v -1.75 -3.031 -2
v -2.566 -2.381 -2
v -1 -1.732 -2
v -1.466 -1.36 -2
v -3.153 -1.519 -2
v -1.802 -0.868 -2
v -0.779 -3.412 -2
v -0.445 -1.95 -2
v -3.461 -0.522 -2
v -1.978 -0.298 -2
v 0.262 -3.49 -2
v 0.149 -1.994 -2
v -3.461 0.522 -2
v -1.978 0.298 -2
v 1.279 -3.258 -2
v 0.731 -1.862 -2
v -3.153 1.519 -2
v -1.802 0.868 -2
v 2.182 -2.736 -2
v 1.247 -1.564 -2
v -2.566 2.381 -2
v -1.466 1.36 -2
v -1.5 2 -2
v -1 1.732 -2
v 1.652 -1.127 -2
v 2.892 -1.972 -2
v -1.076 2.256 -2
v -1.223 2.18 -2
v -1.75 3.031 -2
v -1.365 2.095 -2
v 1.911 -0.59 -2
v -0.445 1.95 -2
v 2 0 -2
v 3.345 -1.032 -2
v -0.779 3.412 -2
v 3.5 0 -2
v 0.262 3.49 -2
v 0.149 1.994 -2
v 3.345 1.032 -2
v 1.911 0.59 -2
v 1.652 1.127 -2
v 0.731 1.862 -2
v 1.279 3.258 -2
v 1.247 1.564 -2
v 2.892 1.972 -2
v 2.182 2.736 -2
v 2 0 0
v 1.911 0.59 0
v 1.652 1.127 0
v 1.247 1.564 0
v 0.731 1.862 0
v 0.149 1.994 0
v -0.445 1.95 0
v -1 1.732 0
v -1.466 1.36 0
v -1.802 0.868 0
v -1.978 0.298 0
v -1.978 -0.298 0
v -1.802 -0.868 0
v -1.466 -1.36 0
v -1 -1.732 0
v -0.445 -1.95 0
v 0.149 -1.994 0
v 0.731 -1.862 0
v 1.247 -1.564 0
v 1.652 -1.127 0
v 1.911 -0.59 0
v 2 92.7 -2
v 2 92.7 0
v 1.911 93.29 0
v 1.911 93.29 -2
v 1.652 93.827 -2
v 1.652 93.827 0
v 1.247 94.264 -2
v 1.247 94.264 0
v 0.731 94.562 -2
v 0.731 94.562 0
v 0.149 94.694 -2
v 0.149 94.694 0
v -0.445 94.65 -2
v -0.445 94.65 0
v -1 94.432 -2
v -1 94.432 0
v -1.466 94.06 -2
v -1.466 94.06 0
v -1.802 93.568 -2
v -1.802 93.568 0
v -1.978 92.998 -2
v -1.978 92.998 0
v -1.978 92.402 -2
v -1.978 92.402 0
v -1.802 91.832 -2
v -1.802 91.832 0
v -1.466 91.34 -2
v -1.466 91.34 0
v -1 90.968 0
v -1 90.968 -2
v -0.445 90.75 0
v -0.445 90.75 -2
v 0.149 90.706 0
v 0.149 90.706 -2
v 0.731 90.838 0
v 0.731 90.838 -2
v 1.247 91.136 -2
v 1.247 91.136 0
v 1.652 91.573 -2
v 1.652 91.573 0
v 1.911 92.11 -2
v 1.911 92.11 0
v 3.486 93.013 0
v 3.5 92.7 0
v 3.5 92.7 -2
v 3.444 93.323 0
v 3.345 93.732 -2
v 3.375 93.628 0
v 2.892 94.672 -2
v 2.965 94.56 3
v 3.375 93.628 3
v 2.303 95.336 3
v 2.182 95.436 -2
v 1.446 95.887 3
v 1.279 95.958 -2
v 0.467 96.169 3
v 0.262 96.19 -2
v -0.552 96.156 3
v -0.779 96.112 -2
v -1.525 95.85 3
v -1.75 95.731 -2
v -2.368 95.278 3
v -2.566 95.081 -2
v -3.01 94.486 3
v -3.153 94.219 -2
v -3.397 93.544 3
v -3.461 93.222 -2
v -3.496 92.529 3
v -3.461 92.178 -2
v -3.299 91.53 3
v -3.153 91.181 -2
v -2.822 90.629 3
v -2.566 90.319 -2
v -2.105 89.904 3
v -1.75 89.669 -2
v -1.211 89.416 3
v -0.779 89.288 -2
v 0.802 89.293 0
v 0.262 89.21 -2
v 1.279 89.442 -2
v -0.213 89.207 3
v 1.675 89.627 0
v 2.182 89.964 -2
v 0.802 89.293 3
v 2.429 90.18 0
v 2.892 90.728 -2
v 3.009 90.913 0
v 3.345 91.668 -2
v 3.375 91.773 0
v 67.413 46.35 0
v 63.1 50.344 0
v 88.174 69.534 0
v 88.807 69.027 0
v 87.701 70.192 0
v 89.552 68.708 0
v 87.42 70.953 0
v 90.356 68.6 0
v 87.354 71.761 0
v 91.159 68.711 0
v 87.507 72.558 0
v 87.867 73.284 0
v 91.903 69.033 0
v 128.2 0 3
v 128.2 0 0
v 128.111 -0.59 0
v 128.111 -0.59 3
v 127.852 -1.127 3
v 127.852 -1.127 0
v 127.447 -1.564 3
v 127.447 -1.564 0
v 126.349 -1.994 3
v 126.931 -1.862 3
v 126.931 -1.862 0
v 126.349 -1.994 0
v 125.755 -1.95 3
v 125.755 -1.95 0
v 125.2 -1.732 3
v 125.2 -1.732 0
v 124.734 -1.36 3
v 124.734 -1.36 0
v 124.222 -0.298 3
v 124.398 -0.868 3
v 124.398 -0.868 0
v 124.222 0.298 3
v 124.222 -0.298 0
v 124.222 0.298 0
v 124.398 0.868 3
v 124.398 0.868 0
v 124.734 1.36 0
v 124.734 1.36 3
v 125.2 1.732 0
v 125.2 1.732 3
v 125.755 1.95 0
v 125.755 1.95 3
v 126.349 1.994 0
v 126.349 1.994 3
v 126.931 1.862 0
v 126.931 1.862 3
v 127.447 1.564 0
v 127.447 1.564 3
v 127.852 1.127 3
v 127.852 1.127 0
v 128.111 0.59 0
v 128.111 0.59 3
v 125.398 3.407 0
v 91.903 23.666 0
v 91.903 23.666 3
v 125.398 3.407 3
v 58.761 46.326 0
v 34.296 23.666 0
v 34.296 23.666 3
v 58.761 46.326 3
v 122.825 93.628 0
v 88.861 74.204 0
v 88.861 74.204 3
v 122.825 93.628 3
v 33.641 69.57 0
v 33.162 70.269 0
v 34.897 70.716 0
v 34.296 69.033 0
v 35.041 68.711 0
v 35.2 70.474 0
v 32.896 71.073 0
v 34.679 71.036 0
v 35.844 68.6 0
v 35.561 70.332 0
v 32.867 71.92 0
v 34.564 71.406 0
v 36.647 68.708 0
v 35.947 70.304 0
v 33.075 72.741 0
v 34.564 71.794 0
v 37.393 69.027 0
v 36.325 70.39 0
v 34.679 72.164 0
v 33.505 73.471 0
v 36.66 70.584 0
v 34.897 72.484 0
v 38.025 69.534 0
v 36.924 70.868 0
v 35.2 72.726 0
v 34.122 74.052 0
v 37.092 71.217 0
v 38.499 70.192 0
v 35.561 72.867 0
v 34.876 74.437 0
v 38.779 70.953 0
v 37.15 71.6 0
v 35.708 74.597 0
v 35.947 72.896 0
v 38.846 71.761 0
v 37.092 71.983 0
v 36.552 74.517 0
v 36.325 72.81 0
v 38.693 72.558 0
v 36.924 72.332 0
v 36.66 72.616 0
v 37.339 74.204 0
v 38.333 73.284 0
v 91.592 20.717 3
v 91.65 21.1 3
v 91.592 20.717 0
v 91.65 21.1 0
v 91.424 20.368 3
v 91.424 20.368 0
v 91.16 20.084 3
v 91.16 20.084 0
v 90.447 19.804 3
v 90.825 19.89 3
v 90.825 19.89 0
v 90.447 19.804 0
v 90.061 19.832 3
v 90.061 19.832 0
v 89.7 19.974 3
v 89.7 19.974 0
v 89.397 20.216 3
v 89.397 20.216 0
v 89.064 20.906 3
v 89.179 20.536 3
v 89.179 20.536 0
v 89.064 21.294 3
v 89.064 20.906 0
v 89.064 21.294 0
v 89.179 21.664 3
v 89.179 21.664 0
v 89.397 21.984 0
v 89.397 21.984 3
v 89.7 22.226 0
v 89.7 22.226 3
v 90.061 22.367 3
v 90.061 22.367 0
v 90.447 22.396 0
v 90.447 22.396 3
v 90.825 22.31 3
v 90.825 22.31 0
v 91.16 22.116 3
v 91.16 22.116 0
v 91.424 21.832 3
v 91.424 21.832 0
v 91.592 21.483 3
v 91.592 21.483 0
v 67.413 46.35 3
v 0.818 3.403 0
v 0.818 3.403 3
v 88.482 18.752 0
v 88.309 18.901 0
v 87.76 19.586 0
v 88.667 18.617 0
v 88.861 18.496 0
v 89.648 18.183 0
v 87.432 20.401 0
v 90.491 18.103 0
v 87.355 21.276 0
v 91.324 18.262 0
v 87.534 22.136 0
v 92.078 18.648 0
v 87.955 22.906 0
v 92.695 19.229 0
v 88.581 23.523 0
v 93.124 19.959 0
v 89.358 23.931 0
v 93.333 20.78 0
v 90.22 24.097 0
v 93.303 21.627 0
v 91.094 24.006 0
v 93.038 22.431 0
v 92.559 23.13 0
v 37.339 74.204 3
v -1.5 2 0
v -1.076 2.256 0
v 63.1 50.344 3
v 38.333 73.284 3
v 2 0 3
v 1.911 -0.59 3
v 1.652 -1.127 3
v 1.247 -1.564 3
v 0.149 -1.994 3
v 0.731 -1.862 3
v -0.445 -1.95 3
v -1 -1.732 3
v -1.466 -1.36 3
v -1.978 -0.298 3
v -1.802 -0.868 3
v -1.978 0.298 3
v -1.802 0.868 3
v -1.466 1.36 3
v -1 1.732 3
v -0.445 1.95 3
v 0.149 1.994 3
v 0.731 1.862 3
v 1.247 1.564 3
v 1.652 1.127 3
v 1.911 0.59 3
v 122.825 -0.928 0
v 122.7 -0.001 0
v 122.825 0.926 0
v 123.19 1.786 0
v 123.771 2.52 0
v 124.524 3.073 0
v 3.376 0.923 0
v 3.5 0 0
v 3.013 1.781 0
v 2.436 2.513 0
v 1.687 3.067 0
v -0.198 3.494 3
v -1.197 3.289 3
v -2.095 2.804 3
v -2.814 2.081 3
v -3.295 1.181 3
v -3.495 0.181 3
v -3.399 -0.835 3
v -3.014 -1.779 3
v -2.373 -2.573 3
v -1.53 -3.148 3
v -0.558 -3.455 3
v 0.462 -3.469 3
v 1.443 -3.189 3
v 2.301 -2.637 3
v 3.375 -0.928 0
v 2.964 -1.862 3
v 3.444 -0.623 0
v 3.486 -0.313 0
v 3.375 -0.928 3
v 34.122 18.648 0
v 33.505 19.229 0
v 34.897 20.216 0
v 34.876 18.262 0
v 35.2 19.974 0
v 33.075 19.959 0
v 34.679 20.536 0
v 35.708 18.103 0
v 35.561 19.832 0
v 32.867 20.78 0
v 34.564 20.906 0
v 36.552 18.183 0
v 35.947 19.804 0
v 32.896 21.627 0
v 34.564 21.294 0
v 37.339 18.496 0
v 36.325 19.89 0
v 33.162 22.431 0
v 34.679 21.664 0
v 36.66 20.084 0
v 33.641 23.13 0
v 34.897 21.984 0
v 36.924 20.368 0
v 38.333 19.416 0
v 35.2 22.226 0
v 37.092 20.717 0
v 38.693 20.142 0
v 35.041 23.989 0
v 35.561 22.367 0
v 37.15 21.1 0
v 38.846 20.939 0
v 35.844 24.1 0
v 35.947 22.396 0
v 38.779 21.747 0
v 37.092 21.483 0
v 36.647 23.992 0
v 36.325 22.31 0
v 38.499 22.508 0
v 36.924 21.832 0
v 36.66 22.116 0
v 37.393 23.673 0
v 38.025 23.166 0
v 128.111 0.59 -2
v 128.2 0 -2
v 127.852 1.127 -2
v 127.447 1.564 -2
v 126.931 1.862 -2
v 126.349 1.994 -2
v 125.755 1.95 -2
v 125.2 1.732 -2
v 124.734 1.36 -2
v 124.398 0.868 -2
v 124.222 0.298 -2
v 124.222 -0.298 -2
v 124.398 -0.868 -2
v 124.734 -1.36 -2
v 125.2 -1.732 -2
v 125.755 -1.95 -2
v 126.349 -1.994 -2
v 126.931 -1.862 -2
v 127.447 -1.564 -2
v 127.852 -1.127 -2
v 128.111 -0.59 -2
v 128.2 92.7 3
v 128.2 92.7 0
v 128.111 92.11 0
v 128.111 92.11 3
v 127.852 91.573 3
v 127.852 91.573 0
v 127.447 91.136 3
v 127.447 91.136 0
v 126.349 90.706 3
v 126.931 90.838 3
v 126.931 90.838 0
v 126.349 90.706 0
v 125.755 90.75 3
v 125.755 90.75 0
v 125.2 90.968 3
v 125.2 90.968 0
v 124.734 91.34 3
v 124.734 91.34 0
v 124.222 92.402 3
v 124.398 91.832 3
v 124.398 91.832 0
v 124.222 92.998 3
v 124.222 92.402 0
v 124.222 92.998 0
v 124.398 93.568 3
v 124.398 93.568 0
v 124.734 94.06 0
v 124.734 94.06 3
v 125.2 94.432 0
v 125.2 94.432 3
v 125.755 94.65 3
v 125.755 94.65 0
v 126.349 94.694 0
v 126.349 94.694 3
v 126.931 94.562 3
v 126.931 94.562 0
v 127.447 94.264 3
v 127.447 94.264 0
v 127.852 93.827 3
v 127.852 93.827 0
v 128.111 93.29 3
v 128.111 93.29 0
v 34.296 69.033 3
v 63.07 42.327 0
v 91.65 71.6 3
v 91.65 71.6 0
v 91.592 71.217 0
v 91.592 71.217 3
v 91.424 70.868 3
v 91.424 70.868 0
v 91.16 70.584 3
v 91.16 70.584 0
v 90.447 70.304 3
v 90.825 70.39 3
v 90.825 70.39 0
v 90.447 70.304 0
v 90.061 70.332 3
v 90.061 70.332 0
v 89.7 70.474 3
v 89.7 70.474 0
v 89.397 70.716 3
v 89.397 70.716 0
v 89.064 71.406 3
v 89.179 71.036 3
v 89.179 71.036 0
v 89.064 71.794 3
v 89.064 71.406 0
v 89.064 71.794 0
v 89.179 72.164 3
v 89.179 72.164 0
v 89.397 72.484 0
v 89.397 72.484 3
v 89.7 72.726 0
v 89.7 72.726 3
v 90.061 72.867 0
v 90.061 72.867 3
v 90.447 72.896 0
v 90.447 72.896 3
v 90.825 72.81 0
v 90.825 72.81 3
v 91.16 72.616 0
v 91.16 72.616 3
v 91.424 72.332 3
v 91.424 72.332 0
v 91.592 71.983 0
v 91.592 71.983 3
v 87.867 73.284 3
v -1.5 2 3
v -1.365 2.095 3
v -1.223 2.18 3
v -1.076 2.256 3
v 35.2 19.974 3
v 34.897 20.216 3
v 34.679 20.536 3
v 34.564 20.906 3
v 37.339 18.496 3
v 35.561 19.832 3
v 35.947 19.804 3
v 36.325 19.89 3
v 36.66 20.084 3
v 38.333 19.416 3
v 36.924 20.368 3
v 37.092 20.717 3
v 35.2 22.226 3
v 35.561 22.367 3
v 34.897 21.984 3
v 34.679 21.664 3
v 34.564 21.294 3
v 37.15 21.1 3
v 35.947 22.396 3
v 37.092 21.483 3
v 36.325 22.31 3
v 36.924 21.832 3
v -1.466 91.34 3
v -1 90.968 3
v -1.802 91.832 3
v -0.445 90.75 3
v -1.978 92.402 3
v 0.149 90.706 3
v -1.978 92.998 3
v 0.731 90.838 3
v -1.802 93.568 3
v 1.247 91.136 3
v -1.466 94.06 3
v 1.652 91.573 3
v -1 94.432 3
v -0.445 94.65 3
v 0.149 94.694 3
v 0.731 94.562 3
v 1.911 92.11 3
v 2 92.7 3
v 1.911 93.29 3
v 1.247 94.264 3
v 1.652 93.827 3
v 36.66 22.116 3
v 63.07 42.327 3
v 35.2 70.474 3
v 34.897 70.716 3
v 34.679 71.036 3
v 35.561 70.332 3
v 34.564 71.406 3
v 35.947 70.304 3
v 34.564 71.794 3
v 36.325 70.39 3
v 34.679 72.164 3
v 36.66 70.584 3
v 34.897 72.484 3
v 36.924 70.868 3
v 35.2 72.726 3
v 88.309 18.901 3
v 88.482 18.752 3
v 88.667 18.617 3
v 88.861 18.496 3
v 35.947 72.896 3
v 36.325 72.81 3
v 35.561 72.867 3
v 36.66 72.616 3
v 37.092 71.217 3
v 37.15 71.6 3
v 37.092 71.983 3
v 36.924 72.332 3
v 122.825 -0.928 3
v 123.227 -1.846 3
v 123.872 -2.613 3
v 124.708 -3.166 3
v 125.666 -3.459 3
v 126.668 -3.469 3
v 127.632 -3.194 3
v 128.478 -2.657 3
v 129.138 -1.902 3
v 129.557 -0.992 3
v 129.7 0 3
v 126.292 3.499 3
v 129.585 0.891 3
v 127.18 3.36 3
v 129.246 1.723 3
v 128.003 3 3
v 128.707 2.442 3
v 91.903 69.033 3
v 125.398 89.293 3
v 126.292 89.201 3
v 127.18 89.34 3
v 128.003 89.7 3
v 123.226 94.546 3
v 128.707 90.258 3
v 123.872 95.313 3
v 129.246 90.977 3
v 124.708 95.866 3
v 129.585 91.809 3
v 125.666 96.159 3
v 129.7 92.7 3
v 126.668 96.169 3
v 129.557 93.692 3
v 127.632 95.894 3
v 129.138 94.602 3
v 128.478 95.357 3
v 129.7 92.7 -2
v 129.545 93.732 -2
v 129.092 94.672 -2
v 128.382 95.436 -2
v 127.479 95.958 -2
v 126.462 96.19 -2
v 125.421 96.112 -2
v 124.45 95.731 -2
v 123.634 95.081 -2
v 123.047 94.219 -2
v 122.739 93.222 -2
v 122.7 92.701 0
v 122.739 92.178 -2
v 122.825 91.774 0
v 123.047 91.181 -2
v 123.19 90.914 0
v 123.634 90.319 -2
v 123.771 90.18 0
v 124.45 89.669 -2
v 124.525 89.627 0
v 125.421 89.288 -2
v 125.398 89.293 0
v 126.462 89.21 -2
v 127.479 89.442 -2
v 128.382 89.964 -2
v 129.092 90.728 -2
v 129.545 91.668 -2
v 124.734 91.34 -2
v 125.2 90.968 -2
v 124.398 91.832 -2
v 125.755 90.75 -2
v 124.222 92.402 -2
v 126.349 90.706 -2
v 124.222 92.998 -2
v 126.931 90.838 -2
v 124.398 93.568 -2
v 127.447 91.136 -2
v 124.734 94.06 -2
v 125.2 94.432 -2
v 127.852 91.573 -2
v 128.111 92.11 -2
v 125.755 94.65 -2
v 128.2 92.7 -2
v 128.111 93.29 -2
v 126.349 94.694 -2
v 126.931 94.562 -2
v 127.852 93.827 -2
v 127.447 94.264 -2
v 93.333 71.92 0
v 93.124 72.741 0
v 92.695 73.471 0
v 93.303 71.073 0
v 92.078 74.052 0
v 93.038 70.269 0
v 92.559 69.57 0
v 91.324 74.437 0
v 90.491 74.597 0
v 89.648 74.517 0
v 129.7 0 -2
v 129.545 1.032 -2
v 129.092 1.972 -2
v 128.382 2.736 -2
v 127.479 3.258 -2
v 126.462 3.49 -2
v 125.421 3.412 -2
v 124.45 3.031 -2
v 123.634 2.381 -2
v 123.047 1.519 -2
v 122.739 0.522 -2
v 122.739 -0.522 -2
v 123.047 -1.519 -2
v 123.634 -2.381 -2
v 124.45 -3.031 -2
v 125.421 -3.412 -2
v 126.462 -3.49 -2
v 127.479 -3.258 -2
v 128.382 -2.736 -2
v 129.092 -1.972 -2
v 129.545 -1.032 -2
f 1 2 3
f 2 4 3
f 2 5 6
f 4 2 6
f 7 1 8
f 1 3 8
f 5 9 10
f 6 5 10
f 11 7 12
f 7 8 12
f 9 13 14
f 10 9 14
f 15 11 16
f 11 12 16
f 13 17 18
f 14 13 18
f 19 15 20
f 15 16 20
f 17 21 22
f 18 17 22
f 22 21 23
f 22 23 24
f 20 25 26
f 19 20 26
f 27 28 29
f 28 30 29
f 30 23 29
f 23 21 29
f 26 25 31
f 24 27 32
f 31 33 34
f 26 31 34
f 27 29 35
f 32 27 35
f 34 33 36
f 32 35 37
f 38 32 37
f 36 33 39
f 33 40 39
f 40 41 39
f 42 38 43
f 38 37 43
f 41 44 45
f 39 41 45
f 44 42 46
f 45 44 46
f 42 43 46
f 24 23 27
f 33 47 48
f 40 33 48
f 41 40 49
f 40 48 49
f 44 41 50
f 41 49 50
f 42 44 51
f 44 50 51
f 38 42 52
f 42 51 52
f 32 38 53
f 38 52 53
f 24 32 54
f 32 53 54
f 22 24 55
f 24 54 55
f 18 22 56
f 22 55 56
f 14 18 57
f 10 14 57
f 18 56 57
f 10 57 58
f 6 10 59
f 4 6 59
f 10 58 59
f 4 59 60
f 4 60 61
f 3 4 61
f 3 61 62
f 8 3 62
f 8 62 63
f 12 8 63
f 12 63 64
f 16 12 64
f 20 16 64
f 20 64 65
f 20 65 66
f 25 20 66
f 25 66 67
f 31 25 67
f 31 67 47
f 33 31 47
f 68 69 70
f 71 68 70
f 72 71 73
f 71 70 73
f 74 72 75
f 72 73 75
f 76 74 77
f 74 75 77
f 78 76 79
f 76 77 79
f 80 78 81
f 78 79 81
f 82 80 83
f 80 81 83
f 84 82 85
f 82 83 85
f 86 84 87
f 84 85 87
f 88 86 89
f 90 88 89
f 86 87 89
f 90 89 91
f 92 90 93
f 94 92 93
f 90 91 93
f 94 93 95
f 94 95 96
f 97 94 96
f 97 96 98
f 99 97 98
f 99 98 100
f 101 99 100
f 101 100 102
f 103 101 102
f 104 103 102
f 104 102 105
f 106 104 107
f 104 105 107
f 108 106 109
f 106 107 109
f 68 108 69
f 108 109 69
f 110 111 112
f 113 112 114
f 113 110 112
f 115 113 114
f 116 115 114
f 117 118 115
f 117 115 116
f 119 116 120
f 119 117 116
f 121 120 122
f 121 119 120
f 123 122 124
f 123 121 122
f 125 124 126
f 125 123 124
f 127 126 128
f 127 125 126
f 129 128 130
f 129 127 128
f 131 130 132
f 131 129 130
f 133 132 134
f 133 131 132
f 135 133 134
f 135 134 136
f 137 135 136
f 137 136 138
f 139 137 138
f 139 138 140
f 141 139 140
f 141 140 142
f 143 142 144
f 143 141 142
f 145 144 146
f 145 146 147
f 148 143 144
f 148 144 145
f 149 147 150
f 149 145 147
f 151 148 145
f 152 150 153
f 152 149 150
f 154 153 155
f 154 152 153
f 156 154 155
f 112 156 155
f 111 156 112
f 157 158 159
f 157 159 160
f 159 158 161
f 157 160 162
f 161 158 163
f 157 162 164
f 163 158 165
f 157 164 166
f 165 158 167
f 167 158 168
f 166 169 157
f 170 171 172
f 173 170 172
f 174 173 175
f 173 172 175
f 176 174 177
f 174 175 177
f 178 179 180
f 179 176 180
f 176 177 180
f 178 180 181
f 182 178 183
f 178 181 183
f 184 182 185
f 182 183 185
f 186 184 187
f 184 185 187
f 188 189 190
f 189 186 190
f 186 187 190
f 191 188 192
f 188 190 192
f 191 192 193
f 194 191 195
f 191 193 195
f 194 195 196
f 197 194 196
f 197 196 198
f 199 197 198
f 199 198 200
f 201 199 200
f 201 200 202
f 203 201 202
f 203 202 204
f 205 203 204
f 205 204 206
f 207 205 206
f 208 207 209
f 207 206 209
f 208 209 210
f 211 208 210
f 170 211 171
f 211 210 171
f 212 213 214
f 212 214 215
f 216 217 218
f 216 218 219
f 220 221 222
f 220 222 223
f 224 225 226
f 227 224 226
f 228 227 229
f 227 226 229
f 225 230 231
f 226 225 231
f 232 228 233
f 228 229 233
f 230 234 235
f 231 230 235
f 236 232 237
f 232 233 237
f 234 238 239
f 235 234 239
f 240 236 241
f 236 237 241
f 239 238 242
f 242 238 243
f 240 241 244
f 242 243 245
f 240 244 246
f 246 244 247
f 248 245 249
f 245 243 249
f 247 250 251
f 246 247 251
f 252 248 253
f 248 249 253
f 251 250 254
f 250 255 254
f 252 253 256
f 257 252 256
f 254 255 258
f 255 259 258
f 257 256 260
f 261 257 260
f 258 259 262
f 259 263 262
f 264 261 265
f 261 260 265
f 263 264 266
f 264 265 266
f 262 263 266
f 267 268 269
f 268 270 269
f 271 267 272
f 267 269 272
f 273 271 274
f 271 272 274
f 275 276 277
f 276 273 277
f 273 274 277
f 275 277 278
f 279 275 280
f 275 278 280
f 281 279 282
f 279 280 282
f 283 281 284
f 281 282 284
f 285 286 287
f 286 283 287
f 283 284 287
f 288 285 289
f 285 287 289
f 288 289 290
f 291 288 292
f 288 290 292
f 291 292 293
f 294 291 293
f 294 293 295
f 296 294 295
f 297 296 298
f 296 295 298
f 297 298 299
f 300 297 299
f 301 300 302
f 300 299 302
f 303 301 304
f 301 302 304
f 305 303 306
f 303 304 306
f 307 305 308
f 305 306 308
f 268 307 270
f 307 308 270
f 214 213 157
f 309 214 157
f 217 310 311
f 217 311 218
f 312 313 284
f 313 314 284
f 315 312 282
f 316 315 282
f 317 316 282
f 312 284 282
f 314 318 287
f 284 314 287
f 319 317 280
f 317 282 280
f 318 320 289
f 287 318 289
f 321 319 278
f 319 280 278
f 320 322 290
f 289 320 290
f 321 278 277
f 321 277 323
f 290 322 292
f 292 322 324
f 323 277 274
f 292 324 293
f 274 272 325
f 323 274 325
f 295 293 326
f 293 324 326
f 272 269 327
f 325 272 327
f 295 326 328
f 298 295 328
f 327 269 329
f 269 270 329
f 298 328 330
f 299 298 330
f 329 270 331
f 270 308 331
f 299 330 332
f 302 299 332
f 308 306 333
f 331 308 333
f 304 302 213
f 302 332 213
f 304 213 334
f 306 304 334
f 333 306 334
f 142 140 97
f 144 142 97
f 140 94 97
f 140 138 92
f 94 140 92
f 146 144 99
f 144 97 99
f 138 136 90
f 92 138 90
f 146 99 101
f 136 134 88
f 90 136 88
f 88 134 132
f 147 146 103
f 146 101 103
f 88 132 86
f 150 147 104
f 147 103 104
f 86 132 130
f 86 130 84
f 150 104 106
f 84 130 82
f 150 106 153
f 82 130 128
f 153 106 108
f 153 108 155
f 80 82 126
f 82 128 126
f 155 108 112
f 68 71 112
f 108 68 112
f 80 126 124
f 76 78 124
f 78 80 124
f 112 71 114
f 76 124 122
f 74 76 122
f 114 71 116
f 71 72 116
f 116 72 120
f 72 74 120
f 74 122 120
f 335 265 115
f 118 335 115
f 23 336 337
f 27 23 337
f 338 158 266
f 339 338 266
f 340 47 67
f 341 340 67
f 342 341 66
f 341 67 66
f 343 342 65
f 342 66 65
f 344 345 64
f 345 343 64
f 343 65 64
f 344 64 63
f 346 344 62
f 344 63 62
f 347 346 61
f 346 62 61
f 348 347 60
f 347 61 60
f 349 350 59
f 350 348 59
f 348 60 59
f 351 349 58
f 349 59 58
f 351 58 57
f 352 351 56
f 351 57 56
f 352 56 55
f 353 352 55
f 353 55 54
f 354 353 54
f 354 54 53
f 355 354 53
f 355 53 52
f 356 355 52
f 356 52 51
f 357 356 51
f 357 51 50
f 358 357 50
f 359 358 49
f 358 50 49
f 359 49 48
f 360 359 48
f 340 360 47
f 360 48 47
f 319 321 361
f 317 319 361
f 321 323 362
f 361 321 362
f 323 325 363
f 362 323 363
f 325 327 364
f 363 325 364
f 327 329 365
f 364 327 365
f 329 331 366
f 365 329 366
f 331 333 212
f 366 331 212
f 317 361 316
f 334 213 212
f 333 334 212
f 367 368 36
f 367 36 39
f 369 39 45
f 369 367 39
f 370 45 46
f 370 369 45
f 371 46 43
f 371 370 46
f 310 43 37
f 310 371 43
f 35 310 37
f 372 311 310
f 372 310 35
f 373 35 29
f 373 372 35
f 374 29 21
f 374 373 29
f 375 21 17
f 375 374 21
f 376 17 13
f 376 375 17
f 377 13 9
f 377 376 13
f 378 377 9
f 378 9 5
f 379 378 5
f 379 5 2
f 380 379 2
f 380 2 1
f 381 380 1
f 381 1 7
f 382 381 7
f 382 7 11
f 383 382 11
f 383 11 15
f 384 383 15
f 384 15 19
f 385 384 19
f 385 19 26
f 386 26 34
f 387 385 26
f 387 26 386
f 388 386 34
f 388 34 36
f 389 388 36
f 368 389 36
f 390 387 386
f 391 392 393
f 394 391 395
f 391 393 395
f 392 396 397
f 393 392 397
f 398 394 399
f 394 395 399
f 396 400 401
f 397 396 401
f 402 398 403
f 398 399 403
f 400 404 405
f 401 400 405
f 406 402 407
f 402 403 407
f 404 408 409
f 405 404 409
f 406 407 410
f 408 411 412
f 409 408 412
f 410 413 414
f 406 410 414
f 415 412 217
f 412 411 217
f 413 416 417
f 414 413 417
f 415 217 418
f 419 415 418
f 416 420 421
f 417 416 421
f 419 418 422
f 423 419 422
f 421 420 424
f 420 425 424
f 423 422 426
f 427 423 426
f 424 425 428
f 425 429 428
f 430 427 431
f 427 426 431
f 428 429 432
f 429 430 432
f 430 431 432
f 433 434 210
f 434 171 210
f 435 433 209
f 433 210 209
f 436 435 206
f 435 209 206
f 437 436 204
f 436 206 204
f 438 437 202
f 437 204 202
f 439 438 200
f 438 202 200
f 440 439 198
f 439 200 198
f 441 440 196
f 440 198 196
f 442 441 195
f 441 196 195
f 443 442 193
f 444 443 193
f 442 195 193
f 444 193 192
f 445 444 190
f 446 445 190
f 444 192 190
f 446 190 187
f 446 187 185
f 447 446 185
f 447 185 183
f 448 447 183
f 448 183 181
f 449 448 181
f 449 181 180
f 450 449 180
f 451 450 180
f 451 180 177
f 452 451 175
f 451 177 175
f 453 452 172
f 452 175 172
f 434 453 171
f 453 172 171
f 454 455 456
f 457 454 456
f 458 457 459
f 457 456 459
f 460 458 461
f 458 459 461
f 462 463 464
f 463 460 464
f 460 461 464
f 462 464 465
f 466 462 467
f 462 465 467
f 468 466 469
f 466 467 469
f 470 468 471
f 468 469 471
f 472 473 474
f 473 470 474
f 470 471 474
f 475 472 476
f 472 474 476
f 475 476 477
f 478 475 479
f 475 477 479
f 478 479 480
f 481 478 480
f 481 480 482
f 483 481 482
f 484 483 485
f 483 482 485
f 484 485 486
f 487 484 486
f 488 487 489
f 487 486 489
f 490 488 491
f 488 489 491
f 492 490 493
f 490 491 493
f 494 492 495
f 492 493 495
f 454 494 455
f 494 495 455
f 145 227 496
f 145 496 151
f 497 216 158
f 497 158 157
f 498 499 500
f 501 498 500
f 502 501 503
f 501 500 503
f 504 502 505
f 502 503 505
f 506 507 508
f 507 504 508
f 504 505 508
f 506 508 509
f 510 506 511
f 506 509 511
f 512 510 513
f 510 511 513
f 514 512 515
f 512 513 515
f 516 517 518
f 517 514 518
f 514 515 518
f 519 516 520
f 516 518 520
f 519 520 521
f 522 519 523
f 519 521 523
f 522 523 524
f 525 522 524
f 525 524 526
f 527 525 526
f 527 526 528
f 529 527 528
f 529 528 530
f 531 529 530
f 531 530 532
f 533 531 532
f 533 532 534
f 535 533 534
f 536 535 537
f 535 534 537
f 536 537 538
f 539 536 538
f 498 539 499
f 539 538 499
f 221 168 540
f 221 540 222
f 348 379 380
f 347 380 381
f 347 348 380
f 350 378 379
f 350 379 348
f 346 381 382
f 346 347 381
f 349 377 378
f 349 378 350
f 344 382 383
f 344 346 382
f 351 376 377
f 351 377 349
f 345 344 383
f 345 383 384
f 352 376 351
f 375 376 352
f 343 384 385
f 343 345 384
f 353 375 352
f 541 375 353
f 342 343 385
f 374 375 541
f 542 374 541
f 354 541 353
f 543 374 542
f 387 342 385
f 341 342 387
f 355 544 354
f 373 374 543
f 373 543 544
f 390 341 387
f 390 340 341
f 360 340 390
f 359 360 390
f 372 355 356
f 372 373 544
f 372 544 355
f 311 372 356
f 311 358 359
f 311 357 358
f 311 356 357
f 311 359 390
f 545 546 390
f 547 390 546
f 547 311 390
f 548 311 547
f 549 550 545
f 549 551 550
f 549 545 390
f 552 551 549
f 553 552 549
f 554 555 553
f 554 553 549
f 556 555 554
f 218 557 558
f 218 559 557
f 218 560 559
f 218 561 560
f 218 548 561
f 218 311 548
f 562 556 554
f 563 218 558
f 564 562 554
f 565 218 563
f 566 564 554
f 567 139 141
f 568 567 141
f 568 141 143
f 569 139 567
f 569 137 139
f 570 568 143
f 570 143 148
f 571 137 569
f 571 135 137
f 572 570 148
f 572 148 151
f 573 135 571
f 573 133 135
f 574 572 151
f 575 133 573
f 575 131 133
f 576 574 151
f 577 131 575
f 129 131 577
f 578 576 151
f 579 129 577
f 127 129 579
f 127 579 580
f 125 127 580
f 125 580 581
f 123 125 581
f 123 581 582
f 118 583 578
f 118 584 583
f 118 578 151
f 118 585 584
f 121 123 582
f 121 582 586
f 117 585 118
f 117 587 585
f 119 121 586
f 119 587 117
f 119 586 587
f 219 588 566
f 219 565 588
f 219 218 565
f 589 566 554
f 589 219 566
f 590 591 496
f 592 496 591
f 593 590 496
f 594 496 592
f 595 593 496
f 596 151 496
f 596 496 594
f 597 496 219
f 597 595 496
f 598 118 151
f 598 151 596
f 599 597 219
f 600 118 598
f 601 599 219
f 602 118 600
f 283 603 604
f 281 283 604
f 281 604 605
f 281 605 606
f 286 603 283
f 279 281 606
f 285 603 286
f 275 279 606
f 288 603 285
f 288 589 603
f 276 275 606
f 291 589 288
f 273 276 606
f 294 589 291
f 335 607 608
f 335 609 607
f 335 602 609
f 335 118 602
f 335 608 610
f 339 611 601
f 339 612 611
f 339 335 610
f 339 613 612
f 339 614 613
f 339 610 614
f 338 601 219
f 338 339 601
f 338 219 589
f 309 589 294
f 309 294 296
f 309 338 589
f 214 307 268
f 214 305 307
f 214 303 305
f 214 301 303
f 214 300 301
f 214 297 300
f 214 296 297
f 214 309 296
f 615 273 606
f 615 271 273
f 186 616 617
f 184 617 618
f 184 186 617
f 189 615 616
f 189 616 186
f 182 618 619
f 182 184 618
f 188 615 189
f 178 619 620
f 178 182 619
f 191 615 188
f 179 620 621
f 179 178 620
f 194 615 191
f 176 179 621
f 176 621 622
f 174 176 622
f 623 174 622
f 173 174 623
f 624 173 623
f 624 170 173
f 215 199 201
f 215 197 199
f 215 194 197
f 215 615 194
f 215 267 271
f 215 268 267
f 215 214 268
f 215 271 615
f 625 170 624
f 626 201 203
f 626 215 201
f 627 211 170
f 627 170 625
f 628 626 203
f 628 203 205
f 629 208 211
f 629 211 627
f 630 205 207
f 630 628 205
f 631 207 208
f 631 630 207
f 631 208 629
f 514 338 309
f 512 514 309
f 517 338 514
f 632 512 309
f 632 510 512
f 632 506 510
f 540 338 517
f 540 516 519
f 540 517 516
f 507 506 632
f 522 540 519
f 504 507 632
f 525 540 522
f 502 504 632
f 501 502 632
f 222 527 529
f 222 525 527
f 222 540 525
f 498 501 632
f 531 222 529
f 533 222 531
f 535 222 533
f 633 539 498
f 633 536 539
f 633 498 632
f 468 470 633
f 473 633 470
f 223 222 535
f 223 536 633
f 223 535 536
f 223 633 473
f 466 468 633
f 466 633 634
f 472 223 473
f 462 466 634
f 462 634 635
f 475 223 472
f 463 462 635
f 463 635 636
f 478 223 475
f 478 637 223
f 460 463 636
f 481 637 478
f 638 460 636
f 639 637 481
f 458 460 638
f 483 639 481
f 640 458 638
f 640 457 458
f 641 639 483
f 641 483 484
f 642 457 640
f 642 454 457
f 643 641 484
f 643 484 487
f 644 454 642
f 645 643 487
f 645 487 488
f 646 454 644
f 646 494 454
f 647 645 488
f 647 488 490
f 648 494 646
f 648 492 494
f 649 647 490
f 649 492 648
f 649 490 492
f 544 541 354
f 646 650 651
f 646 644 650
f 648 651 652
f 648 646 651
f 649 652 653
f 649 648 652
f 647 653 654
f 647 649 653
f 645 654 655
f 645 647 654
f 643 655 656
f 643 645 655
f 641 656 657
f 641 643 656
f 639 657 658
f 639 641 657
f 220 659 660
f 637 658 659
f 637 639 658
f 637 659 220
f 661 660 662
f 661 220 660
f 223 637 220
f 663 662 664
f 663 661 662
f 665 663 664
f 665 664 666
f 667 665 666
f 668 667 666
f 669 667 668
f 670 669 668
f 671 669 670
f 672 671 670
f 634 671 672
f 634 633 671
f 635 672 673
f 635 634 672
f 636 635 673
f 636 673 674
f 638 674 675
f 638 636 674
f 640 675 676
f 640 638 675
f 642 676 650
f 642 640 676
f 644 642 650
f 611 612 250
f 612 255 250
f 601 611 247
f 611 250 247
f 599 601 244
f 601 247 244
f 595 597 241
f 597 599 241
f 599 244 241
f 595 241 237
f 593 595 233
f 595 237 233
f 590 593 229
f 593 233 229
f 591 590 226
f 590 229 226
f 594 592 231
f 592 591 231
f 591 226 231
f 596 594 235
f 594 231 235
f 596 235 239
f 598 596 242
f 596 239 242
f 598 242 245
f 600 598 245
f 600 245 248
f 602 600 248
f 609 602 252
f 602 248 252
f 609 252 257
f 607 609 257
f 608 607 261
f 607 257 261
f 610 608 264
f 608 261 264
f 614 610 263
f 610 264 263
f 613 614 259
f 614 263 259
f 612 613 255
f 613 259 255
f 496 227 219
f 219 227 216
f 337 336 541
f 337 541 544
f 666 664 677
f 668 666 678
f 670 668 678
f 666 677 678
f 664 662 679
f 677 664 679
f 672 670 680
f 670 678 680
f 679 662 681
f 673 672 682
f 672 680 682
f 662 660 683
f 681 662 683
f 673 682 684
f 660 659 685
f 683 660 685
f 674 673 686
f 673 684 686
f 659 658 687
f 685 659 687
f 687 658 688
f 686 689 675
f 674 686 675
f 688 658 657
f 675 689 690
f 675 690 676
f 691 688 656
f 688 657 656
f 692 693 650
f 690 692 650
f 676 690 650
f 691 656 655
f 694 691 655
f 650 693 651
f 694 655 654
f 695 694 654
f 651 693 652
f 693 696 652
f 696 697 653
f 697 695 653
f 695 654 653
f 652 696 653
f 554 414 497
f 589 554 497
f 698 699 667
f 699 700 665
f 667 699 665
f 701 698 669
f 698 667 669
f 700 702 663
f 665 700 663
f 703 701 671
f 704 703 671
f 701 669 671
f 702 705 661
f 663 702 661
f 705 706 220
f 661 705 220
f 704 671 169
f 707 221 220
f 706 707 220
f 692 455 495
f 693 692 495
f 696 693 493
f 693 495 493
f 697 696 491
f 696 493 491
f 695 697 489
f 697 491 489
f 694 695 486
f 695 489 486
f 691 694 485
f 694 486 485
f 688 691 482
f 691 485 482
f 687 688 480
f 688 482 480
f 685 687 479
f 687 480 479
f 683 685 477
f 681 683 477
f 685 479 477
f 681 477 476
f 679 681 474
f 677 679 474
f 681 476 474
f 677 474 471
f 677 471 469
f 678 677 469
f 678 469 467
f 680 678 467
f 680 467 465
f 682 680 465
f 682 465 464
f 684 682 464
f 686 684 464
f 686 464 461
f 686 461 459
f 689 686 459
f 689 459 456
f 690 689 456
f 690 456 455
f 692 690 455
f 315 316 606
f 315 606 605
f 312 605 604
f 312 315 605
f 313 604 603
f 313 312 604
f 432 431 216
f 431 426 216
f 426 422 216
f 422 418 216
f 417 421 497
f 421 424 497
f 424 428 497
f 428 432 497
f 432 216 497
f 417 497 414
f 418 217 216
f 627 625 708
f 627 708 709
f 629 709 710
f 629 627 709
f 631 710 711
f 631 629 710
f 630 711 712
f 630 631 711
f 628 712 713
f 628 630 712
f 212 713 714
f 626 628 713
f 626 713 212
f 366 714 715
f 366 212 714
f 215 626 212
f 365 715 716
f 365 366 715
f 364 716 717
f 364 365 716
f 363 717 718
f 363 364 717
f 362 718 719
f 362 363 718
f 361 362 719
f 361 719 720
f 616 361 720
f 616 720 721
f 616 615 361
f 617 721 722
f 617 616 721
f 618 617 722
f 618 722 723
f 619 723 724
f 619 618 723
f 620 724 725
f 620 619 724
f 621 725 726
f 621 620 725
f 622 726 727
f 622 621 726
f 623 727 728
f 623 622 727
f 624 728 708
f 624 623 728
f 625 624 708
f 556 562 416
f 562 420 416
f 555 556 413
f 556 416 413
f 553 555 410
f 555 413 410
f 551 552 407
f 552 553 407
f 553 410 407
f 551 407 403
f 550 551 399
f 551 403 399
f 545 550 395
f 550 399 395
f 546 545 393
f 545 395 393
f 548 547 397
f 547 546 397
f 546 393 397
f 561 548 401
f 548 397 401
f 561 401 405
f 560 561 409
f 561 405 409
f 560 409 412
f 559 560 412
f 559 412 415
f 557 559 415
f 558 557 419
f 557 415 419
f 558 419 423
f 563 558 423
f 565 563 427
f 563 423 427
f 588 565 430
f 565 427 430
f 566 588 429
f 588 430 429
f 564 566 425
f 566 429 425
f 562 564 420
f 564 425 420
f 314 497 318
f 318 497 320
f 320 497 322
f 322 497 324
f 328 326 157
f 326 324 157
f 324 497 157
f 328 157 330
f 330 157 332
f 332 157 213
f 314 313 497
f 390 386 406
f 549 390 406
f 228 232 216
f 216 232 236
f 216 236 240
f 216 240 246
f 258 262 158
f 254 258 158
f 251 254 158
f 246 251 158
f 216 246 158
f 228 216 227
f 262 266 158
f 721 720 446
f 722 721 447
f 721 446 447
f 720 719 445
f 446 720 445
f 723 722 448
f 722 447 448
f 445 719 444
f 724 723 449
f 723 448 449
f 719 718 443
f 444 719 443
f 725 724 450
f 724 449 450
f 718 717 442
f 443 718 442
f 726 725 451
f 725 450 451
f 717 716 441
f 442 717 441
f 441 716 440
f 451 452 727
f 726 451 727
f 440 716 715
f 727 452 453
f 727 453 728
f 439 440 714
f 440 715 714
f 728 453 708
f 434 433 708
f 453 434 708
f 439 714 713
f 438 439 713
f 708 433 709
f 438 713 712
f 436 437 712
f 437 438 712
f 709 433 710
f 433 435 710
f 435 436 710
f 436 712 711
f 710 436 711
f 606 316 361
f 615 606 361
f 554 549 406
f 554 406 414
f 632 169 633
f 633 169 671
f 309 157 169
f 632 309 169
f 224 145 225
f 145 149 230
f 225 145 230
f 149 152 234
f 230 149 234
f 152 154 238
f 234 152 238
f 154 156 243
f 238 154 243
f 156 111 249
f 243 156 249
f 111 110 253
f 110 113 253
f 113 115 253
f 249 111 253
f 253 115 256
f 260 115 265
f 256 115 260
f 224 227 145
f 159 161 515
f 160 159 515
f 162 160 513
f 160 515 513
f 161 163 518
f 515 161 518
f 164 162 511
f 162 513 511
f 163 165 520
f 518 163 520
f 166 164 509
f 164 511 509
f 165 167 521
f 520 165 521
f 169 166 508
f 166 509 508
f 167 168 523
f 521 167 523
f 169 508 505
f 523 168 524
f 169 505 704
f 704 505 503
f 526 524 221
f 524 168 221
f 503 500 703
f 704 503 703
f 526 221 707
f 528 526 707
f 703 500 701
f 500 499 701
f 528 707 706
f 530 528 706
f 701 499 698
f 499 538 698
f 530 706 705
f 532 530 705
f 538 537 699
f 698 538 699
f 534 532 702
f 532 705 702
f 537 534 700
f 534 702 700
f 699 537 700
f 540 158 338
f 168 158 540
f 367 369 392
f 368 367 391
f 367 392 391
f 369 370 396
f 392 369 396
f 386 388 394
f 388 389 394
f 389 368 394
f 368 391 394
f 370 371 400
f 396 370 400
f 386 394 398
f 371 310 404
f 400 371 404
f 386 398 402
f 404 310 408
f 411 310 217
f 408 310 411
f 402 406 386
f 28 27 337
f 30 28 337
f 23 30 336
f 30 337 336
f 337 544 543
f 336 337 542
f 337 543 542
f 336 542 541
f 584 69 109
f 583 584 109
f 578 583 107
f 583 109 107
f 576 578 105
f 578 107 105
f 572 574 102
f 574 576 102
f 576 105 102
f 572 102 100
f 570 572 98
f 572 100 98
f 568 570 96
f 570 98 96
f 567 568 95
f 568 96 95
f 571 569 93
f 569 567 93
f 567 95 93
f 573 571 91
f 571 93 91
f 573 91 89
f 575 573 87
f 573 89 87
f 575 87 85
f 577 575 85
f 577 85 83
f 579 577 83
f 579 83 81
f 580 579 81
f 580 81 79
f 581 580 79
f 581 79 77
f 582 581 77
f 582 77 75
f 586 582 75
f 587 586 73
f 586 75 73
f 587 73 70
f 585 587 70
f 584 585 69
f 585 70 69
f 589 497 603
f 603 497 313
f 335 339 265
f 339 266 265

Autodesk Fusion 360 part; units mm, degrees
sketch "Sketch1" plane through (0, 0, 0) normal (0, 0, 1) x (1, 0, 0)
  line L0 (0, 0) -> (126.2, 0) construction
  line L1 (126.2, 0) -> (126.2, 92.7) construction
  line L2 (126.2, 92.7) -> (0, 92.7) construction
  line L3 (0, 92.7) -> (0, 0) construction
  circle A0 centre (126.2, 0) radius 2
  circle A1 centre (126.2, 92.7) radius 2
  circle A2 centre (0, 92.7) radius 2
  circle A3 centre (0, 0) radius 2
  line L4 (0, 92.7) -> (-5, 92.7) construction
  line L5 (0, 92.7) -> (0, 97.7) construction
  line L6 (0, 97.7) -> (-5, 92.7) construction
  line L7 (126.2, 0) -> (131.2, 0) construction
  line L8 (126.2, 0) -> (126.2, -5) construction
  line L9 (126.2, -5) -> (131.2, 0) construction
  line L10 (-2.5, 95.2) -> (128.7, 95.2)
  line L11 (128.7, 95.2) -> (128.7, -2.5)
  line L12 (128.7, -2.5) -> (-2.5, -2.5)
  line L13 (-2.5, -2.5) -> (-2.5, 95.2)
  line L14 (35.8499, 71.5999) -> (90.3499, 71.5999) construction
  line L15 (90.3499, 71.5999) -> (90.3499, 21.0999) construction
  line L16 (90.3499, 21.0999) -> (35.8499, 21.0999) construction
  line L17 (35.8499, 21.0999) -> (35.8499, 71.5999) construction
  line L18 (126.2, 0) -> (0, 92.7) construction
  line L19 (126.2, 92.7) -> (0, 0) construction
  line L20 (35.8499, 71.5999) -> (90.3499, 21.0999) construction
  line L21 (90.3499, 71.5999) -> (35.8499, 21.0999) construction
  circle A4 centre (35.8499, 71.5999) radius 1.3
  circle A5 centre (90.3499, 71.5999) radius 1.3
  circle A6 centre (90.3499, 21.0999) radius 1.3
  circle A7 centre (35.8499, 21.0999) radius 1.3
  circle A8 centre (90.3499, 71.5999) radius 3
  circle A9 centre (35.8499, 71.5999) radius 3
  circle A10 centre (35.8499, 21.0999) radius 3
  circle A11 centre (90.3499, 21.0999) radius 3
  circle A12 centre (126.2, 0) radius 2.5
  circle A13 centre (126.2, 92.7) radius 2.5
  circle A14 centre (0, 92.7) radius 2.5
  circle A15 centre (0, 0) radius 2.5
  line L22 (-1.5, 2) -> (34.2965, 23.6664)
  line L23 (1.5, -2) -> (37.3392, 18.4957)
  line L24 (91.9033, 23.6664) -> (127.4939, 2.1391)
  line L25 (88.8606, 18.4957) -> (124.7009, -2.0006)
  line L26 (37.3392, 74.2041) -> (1.5012, 94.6991)
  line L27 (34.2965, 69.0334) -> (-1.2939, 90.5609)
  line L28 (91.9033, 69.0334) -> (127.4939, 90.5609)
  line L29 (88.8606, 74.2041) -> (124.6996, 94.6997)
  line L30 (37.3392, 18.4957) -> (91.9033, 69.0334)
  line L31 (34.2965, 23.6664) -> (88.8606, 74.2041)
  line L32 (34.2965, 69.0334) -> (88.309, 18.9011)
  line L33 (91.9033, 23.6664) -> (37.3392, 74.2041)
  circle A16 centre (0, 92.7) radius 3.5
  circle A17 centre (0, 0) radius 3.5
  circle A18 centre (126.2, 0) radius 3.5
  circle A19 centre (126.2, 92.7) radius 3.5
  point P0 (-2.5, 95.2)
  point P1 (128.7, -2.5)
  dimension "d1" = 126.2
  dimension "d2" = 92.7
  dimension "d3" = 4
  dimension "d4" = 4
  dimension "d5" = 4
  dimension "d6" = 4
  dimension "d7" = 5
  dimension "d8" = 5
  dimension "d9" = 5
  dimension "d10" = 5
  dimension "d11" = 54.5
  dimension "d12" = 50.5
  dimension "d13" = 2.6
  dimension "d14" = 2.6
  dimension "d15" = 2.6
  dimension "d16" = 2.6
  dimension "d17" = 6
  dimension "d18" = 6
  dimension "d19" = 6
  dimension "d20" = 6
  dimension "d25" = 7
  dimension "d26" = 7
  dimension "d27" = 7
  dimension "d28" = 7
extrude "Extrude1" add sketch "Sketch1" along normal blind 3 contours A14 | A14 L26 L27 A16 | A9 L26 L27 A16 | A13 | A8 L28 L29 A19 | A13 L28 L29 A19 | A9 L33 | A15 L22 | A15 L22 L23 A17 | A10 L22 L23 A17 | A9 L31 L32 L33 | A8 L31 | A10 L30 L31 L32 | A10 L30 | L30 L31 L32 L33 | A8 L30 L31 L33 | A11 L30 L32 L33 | A11 | A12 | A11 L24 L25 A18 | A12 L24 L25 A18 picked at (37.444, 73.3682) picked at (-1.1921, 1.9962) picked at (88.7557, 73.3682) picked at (37.444, 19.3316)
extrude "Extrude2" add sketch "Sketch1" along normal blind -2 and the other way blind -3 contours L10 A16 | L10 L13 A14 A16 | L13 A16 | L10 A14 L26 A16 | A14 | L13 A14 L27 A16 | A14 L26 L27 A16 | L10 A19 | L10 A13 L29 A19 | L13 A15 L22 A17 | L13 A17 | L10 L11 A13 A19 | A13 | A13 L28 L29 A19 | L12 L13 A15 A17 | A15 L22 | A15 L22 L23 A17 | L11 A19 | L11 A13 L28 A19 | L12 A15 L23 A17 | L12 A17 | L11 A18 | L11 A12 L24 A18 | L12 A12 L25 A18 | L12 A18 | A12 | L11 L12 A12 A18 | A12 L24 L25 A18 picked at (-1.1921, 1.9962)
thread "Thread1"
